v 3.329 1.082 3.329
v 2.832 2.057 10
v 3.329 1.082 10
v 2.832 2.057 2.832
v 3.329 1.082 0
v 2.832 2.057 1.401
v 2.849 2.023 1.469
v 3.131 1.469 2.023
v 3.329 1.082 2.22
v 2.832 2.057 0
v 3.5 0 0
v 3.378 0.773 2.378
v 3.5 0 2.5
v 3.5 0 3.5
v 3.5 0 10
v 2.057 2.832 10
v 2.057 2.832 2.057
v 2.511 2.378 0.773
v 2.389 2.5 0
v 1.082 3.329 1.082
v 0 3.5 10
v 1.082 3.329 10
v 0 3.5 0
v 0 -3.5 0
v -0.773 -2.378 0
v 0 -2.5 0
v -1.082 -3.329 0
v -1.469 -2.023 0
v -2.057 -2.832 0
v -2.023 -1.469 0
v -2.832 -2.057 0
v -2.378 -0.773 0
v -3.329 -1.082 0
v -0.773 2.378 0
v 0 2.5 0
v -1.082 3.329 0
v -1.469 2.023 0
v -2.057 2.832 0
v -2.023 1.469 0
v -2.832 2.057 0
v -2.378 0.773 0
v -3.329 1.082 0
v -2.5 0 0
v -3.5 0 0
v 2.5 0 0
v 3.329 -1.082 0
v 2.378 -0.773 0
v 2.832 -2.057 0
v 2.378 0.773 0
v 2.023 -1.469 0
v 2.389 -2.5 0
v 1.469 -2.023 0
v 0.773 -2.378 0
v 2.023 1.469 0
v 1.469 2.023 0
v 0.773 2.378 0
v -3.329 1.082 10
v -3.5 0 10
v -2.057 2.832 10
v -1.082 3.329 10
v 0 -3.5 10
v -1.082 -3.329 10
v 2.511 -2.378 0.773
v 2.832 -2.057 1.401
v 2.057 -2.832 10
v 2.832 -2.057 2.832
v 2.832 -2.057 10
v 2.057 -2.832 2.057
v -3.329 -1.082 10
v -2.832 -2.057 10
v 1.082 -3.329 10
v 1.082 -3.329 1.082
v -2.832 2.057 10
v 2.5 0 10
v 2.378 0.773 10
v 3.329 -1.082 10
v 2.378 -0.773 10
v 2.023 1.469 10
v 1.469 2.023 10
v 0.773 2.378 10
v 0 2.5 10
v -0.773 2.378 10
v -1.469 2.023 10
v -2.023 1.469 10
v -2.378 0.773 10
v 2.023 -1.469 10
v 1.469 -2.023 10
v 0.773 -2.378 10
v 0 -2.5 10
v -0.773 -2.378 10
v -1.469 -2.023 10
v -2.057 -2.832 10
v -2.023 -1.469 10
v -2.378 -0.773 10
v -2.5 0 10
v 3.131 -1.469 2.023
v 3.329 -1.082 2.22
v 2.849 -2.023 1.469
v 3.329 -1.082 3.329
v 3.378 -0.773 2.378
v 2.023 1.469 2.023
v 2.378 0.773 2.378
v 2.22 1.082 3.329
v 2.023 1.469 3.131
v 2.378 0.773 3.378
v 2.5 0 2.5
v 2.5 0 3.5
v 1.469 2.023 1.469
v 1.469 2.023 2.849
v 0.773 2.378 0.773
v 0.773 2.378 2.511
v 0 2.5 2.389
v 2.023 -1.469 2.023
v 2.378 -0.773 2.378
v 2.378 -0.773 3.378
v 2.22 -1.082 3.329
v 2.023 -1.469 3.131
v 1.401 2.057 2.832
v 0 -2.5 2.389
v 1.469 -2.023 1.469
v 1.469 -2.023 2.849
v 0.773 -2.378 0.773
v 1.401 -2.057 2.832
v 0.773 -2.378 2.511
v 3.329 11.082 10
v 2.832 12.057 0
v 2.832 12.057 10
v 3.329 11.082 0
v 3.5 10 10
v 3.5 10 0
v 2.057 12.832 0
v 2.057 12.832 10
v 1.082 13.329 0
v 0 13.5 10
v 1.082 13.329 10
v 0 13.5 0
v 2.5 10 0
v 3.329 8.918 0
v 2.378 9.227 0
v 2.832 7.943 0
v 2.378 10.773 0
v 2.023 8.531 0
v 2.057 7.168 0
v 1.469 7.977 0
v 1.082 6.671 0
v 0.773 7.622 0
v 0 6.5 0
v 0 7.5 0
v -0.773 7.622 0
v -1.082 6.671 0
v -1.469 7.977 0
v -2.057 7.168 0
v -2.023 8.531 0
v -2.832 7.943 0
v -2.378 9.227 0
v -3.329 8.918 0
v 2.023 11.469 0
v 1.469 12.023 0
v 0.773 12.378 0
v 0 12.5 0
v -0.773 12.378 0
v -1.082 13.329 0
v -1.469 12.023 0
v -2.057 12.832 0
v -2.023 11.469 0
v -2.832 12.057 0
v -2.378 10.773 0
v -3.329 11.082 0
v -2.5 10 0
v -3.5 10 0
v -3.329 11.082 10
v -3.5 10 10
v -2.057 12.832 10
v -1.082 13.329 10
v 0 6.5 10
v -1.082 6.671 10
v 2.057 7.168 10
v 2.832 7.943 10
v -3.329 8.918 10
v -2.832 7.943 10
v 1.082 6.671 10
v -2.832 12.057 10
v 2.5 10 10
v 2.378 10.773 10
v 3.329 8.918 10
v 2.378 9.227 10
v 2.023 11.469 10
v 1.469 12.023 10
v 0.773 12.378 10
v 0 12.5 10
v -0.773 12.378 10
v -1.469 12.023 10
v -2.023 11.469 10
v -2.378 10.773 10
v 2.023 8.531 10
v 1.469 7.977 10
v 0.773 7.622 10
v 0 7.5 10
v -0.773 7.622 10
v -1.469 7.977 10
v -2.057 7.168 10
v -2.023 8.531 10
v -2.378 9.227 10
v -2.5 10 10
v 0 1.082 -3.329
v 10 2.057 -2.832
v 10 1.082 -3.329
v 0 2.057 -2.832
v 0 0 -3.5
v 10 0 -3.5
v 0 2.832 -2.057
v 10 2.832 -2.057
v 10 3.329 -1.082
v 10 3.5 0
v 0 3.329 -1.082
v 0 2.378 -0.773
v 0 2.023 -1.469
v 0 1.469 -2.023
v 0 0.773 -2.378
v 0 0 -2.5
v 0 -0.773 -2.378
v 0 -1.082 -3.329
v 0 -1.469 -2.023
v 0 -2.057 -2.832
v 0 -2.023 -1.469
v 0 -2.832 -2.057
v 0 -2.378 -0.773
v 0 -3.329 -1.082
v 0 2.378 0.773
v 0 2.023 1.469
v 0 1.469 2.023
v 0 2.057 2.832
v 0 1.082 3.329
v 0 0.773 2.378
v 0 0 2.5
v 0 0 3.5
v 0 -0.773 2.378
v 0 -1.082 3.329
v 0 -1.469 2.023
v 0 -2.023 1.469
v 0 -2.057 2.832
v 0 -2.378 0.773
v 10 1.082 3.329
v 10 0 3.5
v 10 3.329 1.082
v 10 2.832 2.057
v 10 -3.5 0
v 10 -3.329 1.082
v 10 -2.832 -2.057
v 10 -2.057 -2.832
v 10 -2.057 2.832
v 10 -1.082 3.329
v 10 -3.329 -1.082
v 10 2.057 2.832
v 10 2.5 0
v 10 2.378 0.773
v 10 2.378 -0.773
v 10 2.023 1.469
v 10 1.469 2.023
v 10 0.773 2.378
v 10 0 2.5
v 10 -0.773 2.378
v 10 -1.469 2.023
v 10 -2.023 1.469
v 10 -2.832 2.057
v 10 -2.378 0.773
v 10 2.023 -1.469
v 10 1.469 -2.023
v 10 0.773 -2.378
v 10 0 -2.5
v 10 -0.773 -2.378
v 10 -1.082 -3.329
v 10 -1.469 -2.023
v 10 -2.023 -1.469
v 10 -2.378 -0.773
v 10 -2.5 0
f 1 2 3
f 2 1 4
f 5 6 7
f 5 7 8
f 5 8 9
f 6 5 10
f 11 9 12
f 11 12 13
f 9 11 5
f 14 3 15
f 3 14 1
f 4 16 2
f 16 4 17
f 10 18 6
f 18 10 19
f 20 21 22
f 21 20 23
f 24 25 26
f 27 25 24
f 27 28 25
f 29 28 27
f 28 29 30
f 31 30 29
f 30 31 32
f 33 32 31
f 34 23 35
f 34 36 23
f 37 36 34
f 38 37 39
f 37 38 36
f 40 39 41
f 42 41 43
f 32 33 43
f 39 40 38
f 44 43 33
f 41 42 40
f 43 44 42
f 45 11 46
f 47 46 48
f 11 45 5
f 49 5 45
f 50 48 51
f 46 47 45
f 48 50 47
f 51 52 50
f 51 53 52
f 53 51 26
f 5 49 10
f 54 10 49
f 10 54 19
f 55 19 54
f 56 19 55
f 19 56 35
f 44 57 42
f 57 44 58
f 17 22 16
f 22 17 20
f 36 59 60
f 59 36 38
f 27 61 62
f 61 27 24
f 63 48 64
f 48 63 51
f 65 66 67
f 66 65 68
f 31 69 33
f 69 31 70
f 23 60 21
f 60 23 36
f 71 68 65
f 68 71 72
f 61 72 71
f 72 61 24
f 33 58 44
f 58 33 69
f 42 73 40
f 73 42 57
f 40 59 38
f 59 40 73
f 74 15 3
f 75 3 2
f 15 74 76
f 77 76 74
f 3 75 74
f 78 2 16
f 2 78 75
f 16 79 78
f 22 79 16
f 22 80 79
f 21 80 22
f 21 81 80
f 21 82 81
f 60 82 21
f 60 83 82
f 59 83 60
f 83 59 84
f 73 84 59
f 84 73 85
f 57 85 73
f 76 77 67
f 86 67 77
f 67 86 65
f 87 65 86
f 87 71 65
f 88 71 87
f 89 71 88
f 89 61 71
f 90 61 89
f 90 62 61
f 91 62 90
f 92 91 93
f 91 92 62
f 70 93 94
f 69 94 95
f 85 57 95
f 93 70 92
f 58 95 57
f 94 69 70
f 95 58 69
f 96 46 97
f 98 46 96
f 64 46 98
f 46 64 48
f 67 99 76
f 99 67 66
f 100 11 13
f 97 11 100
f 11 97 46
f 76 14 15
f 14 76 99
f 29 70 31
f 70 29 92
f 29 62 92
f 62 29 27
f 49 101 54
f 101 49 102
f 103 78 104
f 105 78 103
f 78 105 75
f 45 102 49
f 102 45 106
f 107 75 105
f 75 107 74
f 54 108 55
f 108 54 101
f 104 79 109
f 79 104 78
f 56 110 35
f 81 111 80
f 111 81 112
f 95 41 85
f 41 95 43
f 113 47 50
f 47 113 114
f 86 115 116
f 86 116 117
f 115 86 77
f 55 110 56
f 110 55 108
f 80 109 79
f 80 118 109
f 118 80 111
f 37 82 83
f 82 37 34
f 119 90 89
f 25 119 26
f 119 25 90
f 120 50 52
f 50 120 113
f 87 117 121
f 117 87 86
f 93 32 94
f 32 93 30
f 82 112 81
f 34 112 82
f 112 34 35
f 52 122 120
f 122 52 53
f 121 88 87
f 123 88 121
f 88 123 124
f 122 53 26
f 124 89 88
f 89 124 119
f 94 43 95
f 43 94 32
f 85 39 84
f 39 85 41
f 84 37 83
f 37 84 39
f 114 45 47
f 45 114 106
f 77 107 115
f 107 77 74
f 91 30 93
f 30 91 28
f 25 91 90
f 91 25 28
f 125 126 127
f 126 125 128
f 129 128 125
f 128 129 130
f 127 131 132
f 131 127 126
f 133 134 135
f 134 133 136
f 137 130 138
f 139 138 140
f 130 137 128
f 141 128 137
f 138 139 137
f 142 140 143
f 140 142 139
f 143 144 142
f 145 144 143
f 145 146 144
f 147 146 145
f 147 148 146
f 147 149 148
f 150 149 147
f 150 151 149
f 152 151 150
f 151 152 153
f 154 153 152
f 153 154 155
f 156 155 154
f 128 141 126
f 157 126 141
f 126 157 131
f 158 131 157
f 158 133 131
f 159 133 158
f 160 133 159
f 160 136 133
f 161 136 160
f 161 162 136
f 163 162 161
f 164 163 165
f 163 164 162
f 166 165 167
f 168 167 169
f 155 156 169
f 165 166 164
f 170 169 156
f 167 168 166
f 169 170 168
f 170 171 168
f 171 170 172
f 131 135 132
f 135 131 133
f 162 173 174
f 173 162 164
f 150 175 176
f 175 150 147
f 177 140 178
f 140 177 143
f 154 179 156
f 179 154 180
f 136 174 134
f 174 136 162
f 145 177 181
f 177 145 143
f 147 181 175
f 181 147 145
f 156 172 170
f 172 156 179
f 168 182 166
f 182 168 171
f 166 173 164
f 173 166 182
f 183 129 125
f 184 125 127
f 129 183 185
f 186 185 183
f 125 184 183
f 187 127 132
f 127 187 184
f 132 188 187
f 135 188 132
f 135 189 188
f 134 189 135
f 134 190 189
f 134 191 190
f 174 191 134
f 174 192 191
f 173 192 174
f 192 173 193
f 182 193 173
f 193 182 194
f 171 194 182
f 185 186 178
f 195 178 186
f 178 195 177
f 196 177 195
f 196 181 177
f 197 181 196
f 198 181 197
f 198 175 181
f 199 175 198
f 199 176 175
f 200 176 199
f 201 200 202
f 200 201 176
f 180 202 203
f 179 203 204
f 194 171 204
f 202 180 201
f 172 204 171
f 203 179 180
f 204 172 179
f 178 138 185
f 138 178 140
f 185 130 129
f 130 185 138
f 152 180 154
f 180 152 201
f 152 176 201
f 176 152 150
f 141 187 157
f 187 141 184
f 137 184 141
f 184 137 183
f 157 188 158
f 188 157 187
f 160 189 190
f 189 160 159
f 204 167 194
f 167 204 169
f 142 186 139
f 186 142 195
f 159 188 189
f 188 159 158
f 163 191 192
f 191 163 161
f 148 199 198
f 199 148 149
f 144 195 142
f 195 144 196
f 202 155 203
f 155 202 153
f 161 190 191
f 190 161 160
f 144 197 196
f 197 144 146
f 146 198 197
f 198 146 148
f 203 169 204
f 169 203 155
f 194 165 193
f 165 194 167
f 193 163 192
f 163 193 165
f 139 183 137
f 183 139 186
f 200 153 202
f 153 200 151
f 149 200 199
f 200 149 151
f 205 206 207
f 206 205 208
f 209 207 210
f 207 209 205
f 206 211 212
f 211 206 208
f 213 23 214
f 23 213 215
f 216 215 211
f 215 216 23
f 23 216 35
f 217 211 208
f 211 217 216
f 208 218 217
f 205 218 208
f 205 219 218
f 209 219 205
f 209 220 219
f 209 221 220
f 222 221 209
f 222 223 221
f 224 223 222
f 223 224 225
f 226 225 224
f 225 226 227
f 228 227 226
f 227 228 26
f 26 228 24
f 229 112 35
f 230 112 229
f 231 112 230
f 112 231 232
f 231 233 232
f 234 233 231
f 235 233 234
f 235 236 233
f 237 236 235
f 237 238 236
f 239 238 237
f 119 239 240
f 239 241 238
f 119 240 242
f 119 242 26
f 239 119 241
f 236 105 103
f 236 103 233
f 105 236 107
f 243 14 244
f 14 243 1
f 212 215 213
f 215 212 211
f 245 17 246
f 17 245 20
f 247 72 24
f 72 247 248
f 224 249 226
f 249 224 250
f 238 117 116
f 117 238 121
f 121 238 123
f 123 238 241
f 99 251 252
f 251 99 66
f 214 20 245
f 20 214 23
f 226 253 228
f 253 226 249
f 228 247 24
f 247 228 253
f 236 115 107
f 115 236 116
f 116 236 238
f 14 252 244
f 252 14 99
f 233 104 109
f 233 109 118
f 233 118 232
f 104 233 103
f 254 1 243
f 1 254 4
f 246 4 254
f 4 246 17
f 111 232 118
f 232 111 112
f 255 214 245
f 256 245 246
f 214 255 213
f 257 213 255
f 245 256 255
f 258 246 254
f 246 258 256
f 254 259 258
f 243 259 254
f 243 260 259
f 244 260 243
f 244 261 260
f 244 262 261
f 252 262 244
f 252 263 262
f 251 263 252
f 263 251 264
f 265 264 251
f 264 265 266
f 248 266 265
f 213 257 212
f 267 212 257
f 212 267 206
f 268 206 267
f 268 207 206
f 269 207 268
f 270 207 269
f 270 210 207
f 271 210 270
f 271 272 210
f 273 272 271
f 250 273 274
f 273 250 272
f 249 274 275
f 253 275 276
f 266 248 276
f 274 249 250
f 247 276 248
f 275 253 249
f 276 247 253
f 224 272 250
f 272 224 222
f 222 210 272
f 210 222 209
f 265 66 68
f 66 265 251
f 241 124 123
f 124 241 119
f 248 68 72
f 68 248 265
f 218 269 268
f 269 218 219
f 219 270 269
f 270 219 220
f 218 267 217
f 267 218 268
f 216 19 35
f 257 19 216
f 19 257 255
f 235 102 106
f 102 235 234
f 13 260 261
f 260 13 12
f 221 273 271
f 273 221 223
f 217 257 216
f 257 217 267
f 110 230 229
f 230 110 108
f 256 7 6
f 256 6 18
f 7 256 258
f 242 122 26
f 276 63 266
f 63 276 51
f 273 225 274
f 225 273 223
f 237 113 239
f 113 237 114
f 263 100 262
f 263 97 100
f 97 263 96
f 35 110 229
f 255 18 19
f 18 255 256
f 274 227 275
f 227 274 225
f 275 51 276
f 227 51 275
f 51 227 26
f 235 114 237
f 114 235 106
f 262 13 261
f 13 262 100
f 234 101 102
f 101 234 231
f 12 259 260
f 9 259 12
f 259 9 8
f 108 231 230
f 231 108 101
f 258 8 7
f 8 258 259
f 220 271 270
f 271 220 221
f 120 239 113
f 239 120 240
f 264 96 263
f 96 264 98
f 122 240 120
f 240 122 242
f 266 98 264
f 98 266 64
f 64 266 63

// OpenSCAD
a6laenge = 20; 
a6hoehe =14; 
stangendurchmesser = 5; 
wandstaerke = 1; 
zylinderfuehrung = 10;

module zylinder(hoehe=zylinderfuehrung){
    difference(){
        cylinder(d=stangendurchmesser+2*wandstaerke,h=hoehe,$fn=20);
        translate([0,0,-1])
        cylinder(d=stangendurchmesser,h=hoehe+2,$fn=20); 
    }
}

module tstueck(){
    zylinder();
    translate([0,zylinderfuehrung,0])
        zylinder();
    rotate([0,90,0])
        zylinder();
    
}

tstueck();
